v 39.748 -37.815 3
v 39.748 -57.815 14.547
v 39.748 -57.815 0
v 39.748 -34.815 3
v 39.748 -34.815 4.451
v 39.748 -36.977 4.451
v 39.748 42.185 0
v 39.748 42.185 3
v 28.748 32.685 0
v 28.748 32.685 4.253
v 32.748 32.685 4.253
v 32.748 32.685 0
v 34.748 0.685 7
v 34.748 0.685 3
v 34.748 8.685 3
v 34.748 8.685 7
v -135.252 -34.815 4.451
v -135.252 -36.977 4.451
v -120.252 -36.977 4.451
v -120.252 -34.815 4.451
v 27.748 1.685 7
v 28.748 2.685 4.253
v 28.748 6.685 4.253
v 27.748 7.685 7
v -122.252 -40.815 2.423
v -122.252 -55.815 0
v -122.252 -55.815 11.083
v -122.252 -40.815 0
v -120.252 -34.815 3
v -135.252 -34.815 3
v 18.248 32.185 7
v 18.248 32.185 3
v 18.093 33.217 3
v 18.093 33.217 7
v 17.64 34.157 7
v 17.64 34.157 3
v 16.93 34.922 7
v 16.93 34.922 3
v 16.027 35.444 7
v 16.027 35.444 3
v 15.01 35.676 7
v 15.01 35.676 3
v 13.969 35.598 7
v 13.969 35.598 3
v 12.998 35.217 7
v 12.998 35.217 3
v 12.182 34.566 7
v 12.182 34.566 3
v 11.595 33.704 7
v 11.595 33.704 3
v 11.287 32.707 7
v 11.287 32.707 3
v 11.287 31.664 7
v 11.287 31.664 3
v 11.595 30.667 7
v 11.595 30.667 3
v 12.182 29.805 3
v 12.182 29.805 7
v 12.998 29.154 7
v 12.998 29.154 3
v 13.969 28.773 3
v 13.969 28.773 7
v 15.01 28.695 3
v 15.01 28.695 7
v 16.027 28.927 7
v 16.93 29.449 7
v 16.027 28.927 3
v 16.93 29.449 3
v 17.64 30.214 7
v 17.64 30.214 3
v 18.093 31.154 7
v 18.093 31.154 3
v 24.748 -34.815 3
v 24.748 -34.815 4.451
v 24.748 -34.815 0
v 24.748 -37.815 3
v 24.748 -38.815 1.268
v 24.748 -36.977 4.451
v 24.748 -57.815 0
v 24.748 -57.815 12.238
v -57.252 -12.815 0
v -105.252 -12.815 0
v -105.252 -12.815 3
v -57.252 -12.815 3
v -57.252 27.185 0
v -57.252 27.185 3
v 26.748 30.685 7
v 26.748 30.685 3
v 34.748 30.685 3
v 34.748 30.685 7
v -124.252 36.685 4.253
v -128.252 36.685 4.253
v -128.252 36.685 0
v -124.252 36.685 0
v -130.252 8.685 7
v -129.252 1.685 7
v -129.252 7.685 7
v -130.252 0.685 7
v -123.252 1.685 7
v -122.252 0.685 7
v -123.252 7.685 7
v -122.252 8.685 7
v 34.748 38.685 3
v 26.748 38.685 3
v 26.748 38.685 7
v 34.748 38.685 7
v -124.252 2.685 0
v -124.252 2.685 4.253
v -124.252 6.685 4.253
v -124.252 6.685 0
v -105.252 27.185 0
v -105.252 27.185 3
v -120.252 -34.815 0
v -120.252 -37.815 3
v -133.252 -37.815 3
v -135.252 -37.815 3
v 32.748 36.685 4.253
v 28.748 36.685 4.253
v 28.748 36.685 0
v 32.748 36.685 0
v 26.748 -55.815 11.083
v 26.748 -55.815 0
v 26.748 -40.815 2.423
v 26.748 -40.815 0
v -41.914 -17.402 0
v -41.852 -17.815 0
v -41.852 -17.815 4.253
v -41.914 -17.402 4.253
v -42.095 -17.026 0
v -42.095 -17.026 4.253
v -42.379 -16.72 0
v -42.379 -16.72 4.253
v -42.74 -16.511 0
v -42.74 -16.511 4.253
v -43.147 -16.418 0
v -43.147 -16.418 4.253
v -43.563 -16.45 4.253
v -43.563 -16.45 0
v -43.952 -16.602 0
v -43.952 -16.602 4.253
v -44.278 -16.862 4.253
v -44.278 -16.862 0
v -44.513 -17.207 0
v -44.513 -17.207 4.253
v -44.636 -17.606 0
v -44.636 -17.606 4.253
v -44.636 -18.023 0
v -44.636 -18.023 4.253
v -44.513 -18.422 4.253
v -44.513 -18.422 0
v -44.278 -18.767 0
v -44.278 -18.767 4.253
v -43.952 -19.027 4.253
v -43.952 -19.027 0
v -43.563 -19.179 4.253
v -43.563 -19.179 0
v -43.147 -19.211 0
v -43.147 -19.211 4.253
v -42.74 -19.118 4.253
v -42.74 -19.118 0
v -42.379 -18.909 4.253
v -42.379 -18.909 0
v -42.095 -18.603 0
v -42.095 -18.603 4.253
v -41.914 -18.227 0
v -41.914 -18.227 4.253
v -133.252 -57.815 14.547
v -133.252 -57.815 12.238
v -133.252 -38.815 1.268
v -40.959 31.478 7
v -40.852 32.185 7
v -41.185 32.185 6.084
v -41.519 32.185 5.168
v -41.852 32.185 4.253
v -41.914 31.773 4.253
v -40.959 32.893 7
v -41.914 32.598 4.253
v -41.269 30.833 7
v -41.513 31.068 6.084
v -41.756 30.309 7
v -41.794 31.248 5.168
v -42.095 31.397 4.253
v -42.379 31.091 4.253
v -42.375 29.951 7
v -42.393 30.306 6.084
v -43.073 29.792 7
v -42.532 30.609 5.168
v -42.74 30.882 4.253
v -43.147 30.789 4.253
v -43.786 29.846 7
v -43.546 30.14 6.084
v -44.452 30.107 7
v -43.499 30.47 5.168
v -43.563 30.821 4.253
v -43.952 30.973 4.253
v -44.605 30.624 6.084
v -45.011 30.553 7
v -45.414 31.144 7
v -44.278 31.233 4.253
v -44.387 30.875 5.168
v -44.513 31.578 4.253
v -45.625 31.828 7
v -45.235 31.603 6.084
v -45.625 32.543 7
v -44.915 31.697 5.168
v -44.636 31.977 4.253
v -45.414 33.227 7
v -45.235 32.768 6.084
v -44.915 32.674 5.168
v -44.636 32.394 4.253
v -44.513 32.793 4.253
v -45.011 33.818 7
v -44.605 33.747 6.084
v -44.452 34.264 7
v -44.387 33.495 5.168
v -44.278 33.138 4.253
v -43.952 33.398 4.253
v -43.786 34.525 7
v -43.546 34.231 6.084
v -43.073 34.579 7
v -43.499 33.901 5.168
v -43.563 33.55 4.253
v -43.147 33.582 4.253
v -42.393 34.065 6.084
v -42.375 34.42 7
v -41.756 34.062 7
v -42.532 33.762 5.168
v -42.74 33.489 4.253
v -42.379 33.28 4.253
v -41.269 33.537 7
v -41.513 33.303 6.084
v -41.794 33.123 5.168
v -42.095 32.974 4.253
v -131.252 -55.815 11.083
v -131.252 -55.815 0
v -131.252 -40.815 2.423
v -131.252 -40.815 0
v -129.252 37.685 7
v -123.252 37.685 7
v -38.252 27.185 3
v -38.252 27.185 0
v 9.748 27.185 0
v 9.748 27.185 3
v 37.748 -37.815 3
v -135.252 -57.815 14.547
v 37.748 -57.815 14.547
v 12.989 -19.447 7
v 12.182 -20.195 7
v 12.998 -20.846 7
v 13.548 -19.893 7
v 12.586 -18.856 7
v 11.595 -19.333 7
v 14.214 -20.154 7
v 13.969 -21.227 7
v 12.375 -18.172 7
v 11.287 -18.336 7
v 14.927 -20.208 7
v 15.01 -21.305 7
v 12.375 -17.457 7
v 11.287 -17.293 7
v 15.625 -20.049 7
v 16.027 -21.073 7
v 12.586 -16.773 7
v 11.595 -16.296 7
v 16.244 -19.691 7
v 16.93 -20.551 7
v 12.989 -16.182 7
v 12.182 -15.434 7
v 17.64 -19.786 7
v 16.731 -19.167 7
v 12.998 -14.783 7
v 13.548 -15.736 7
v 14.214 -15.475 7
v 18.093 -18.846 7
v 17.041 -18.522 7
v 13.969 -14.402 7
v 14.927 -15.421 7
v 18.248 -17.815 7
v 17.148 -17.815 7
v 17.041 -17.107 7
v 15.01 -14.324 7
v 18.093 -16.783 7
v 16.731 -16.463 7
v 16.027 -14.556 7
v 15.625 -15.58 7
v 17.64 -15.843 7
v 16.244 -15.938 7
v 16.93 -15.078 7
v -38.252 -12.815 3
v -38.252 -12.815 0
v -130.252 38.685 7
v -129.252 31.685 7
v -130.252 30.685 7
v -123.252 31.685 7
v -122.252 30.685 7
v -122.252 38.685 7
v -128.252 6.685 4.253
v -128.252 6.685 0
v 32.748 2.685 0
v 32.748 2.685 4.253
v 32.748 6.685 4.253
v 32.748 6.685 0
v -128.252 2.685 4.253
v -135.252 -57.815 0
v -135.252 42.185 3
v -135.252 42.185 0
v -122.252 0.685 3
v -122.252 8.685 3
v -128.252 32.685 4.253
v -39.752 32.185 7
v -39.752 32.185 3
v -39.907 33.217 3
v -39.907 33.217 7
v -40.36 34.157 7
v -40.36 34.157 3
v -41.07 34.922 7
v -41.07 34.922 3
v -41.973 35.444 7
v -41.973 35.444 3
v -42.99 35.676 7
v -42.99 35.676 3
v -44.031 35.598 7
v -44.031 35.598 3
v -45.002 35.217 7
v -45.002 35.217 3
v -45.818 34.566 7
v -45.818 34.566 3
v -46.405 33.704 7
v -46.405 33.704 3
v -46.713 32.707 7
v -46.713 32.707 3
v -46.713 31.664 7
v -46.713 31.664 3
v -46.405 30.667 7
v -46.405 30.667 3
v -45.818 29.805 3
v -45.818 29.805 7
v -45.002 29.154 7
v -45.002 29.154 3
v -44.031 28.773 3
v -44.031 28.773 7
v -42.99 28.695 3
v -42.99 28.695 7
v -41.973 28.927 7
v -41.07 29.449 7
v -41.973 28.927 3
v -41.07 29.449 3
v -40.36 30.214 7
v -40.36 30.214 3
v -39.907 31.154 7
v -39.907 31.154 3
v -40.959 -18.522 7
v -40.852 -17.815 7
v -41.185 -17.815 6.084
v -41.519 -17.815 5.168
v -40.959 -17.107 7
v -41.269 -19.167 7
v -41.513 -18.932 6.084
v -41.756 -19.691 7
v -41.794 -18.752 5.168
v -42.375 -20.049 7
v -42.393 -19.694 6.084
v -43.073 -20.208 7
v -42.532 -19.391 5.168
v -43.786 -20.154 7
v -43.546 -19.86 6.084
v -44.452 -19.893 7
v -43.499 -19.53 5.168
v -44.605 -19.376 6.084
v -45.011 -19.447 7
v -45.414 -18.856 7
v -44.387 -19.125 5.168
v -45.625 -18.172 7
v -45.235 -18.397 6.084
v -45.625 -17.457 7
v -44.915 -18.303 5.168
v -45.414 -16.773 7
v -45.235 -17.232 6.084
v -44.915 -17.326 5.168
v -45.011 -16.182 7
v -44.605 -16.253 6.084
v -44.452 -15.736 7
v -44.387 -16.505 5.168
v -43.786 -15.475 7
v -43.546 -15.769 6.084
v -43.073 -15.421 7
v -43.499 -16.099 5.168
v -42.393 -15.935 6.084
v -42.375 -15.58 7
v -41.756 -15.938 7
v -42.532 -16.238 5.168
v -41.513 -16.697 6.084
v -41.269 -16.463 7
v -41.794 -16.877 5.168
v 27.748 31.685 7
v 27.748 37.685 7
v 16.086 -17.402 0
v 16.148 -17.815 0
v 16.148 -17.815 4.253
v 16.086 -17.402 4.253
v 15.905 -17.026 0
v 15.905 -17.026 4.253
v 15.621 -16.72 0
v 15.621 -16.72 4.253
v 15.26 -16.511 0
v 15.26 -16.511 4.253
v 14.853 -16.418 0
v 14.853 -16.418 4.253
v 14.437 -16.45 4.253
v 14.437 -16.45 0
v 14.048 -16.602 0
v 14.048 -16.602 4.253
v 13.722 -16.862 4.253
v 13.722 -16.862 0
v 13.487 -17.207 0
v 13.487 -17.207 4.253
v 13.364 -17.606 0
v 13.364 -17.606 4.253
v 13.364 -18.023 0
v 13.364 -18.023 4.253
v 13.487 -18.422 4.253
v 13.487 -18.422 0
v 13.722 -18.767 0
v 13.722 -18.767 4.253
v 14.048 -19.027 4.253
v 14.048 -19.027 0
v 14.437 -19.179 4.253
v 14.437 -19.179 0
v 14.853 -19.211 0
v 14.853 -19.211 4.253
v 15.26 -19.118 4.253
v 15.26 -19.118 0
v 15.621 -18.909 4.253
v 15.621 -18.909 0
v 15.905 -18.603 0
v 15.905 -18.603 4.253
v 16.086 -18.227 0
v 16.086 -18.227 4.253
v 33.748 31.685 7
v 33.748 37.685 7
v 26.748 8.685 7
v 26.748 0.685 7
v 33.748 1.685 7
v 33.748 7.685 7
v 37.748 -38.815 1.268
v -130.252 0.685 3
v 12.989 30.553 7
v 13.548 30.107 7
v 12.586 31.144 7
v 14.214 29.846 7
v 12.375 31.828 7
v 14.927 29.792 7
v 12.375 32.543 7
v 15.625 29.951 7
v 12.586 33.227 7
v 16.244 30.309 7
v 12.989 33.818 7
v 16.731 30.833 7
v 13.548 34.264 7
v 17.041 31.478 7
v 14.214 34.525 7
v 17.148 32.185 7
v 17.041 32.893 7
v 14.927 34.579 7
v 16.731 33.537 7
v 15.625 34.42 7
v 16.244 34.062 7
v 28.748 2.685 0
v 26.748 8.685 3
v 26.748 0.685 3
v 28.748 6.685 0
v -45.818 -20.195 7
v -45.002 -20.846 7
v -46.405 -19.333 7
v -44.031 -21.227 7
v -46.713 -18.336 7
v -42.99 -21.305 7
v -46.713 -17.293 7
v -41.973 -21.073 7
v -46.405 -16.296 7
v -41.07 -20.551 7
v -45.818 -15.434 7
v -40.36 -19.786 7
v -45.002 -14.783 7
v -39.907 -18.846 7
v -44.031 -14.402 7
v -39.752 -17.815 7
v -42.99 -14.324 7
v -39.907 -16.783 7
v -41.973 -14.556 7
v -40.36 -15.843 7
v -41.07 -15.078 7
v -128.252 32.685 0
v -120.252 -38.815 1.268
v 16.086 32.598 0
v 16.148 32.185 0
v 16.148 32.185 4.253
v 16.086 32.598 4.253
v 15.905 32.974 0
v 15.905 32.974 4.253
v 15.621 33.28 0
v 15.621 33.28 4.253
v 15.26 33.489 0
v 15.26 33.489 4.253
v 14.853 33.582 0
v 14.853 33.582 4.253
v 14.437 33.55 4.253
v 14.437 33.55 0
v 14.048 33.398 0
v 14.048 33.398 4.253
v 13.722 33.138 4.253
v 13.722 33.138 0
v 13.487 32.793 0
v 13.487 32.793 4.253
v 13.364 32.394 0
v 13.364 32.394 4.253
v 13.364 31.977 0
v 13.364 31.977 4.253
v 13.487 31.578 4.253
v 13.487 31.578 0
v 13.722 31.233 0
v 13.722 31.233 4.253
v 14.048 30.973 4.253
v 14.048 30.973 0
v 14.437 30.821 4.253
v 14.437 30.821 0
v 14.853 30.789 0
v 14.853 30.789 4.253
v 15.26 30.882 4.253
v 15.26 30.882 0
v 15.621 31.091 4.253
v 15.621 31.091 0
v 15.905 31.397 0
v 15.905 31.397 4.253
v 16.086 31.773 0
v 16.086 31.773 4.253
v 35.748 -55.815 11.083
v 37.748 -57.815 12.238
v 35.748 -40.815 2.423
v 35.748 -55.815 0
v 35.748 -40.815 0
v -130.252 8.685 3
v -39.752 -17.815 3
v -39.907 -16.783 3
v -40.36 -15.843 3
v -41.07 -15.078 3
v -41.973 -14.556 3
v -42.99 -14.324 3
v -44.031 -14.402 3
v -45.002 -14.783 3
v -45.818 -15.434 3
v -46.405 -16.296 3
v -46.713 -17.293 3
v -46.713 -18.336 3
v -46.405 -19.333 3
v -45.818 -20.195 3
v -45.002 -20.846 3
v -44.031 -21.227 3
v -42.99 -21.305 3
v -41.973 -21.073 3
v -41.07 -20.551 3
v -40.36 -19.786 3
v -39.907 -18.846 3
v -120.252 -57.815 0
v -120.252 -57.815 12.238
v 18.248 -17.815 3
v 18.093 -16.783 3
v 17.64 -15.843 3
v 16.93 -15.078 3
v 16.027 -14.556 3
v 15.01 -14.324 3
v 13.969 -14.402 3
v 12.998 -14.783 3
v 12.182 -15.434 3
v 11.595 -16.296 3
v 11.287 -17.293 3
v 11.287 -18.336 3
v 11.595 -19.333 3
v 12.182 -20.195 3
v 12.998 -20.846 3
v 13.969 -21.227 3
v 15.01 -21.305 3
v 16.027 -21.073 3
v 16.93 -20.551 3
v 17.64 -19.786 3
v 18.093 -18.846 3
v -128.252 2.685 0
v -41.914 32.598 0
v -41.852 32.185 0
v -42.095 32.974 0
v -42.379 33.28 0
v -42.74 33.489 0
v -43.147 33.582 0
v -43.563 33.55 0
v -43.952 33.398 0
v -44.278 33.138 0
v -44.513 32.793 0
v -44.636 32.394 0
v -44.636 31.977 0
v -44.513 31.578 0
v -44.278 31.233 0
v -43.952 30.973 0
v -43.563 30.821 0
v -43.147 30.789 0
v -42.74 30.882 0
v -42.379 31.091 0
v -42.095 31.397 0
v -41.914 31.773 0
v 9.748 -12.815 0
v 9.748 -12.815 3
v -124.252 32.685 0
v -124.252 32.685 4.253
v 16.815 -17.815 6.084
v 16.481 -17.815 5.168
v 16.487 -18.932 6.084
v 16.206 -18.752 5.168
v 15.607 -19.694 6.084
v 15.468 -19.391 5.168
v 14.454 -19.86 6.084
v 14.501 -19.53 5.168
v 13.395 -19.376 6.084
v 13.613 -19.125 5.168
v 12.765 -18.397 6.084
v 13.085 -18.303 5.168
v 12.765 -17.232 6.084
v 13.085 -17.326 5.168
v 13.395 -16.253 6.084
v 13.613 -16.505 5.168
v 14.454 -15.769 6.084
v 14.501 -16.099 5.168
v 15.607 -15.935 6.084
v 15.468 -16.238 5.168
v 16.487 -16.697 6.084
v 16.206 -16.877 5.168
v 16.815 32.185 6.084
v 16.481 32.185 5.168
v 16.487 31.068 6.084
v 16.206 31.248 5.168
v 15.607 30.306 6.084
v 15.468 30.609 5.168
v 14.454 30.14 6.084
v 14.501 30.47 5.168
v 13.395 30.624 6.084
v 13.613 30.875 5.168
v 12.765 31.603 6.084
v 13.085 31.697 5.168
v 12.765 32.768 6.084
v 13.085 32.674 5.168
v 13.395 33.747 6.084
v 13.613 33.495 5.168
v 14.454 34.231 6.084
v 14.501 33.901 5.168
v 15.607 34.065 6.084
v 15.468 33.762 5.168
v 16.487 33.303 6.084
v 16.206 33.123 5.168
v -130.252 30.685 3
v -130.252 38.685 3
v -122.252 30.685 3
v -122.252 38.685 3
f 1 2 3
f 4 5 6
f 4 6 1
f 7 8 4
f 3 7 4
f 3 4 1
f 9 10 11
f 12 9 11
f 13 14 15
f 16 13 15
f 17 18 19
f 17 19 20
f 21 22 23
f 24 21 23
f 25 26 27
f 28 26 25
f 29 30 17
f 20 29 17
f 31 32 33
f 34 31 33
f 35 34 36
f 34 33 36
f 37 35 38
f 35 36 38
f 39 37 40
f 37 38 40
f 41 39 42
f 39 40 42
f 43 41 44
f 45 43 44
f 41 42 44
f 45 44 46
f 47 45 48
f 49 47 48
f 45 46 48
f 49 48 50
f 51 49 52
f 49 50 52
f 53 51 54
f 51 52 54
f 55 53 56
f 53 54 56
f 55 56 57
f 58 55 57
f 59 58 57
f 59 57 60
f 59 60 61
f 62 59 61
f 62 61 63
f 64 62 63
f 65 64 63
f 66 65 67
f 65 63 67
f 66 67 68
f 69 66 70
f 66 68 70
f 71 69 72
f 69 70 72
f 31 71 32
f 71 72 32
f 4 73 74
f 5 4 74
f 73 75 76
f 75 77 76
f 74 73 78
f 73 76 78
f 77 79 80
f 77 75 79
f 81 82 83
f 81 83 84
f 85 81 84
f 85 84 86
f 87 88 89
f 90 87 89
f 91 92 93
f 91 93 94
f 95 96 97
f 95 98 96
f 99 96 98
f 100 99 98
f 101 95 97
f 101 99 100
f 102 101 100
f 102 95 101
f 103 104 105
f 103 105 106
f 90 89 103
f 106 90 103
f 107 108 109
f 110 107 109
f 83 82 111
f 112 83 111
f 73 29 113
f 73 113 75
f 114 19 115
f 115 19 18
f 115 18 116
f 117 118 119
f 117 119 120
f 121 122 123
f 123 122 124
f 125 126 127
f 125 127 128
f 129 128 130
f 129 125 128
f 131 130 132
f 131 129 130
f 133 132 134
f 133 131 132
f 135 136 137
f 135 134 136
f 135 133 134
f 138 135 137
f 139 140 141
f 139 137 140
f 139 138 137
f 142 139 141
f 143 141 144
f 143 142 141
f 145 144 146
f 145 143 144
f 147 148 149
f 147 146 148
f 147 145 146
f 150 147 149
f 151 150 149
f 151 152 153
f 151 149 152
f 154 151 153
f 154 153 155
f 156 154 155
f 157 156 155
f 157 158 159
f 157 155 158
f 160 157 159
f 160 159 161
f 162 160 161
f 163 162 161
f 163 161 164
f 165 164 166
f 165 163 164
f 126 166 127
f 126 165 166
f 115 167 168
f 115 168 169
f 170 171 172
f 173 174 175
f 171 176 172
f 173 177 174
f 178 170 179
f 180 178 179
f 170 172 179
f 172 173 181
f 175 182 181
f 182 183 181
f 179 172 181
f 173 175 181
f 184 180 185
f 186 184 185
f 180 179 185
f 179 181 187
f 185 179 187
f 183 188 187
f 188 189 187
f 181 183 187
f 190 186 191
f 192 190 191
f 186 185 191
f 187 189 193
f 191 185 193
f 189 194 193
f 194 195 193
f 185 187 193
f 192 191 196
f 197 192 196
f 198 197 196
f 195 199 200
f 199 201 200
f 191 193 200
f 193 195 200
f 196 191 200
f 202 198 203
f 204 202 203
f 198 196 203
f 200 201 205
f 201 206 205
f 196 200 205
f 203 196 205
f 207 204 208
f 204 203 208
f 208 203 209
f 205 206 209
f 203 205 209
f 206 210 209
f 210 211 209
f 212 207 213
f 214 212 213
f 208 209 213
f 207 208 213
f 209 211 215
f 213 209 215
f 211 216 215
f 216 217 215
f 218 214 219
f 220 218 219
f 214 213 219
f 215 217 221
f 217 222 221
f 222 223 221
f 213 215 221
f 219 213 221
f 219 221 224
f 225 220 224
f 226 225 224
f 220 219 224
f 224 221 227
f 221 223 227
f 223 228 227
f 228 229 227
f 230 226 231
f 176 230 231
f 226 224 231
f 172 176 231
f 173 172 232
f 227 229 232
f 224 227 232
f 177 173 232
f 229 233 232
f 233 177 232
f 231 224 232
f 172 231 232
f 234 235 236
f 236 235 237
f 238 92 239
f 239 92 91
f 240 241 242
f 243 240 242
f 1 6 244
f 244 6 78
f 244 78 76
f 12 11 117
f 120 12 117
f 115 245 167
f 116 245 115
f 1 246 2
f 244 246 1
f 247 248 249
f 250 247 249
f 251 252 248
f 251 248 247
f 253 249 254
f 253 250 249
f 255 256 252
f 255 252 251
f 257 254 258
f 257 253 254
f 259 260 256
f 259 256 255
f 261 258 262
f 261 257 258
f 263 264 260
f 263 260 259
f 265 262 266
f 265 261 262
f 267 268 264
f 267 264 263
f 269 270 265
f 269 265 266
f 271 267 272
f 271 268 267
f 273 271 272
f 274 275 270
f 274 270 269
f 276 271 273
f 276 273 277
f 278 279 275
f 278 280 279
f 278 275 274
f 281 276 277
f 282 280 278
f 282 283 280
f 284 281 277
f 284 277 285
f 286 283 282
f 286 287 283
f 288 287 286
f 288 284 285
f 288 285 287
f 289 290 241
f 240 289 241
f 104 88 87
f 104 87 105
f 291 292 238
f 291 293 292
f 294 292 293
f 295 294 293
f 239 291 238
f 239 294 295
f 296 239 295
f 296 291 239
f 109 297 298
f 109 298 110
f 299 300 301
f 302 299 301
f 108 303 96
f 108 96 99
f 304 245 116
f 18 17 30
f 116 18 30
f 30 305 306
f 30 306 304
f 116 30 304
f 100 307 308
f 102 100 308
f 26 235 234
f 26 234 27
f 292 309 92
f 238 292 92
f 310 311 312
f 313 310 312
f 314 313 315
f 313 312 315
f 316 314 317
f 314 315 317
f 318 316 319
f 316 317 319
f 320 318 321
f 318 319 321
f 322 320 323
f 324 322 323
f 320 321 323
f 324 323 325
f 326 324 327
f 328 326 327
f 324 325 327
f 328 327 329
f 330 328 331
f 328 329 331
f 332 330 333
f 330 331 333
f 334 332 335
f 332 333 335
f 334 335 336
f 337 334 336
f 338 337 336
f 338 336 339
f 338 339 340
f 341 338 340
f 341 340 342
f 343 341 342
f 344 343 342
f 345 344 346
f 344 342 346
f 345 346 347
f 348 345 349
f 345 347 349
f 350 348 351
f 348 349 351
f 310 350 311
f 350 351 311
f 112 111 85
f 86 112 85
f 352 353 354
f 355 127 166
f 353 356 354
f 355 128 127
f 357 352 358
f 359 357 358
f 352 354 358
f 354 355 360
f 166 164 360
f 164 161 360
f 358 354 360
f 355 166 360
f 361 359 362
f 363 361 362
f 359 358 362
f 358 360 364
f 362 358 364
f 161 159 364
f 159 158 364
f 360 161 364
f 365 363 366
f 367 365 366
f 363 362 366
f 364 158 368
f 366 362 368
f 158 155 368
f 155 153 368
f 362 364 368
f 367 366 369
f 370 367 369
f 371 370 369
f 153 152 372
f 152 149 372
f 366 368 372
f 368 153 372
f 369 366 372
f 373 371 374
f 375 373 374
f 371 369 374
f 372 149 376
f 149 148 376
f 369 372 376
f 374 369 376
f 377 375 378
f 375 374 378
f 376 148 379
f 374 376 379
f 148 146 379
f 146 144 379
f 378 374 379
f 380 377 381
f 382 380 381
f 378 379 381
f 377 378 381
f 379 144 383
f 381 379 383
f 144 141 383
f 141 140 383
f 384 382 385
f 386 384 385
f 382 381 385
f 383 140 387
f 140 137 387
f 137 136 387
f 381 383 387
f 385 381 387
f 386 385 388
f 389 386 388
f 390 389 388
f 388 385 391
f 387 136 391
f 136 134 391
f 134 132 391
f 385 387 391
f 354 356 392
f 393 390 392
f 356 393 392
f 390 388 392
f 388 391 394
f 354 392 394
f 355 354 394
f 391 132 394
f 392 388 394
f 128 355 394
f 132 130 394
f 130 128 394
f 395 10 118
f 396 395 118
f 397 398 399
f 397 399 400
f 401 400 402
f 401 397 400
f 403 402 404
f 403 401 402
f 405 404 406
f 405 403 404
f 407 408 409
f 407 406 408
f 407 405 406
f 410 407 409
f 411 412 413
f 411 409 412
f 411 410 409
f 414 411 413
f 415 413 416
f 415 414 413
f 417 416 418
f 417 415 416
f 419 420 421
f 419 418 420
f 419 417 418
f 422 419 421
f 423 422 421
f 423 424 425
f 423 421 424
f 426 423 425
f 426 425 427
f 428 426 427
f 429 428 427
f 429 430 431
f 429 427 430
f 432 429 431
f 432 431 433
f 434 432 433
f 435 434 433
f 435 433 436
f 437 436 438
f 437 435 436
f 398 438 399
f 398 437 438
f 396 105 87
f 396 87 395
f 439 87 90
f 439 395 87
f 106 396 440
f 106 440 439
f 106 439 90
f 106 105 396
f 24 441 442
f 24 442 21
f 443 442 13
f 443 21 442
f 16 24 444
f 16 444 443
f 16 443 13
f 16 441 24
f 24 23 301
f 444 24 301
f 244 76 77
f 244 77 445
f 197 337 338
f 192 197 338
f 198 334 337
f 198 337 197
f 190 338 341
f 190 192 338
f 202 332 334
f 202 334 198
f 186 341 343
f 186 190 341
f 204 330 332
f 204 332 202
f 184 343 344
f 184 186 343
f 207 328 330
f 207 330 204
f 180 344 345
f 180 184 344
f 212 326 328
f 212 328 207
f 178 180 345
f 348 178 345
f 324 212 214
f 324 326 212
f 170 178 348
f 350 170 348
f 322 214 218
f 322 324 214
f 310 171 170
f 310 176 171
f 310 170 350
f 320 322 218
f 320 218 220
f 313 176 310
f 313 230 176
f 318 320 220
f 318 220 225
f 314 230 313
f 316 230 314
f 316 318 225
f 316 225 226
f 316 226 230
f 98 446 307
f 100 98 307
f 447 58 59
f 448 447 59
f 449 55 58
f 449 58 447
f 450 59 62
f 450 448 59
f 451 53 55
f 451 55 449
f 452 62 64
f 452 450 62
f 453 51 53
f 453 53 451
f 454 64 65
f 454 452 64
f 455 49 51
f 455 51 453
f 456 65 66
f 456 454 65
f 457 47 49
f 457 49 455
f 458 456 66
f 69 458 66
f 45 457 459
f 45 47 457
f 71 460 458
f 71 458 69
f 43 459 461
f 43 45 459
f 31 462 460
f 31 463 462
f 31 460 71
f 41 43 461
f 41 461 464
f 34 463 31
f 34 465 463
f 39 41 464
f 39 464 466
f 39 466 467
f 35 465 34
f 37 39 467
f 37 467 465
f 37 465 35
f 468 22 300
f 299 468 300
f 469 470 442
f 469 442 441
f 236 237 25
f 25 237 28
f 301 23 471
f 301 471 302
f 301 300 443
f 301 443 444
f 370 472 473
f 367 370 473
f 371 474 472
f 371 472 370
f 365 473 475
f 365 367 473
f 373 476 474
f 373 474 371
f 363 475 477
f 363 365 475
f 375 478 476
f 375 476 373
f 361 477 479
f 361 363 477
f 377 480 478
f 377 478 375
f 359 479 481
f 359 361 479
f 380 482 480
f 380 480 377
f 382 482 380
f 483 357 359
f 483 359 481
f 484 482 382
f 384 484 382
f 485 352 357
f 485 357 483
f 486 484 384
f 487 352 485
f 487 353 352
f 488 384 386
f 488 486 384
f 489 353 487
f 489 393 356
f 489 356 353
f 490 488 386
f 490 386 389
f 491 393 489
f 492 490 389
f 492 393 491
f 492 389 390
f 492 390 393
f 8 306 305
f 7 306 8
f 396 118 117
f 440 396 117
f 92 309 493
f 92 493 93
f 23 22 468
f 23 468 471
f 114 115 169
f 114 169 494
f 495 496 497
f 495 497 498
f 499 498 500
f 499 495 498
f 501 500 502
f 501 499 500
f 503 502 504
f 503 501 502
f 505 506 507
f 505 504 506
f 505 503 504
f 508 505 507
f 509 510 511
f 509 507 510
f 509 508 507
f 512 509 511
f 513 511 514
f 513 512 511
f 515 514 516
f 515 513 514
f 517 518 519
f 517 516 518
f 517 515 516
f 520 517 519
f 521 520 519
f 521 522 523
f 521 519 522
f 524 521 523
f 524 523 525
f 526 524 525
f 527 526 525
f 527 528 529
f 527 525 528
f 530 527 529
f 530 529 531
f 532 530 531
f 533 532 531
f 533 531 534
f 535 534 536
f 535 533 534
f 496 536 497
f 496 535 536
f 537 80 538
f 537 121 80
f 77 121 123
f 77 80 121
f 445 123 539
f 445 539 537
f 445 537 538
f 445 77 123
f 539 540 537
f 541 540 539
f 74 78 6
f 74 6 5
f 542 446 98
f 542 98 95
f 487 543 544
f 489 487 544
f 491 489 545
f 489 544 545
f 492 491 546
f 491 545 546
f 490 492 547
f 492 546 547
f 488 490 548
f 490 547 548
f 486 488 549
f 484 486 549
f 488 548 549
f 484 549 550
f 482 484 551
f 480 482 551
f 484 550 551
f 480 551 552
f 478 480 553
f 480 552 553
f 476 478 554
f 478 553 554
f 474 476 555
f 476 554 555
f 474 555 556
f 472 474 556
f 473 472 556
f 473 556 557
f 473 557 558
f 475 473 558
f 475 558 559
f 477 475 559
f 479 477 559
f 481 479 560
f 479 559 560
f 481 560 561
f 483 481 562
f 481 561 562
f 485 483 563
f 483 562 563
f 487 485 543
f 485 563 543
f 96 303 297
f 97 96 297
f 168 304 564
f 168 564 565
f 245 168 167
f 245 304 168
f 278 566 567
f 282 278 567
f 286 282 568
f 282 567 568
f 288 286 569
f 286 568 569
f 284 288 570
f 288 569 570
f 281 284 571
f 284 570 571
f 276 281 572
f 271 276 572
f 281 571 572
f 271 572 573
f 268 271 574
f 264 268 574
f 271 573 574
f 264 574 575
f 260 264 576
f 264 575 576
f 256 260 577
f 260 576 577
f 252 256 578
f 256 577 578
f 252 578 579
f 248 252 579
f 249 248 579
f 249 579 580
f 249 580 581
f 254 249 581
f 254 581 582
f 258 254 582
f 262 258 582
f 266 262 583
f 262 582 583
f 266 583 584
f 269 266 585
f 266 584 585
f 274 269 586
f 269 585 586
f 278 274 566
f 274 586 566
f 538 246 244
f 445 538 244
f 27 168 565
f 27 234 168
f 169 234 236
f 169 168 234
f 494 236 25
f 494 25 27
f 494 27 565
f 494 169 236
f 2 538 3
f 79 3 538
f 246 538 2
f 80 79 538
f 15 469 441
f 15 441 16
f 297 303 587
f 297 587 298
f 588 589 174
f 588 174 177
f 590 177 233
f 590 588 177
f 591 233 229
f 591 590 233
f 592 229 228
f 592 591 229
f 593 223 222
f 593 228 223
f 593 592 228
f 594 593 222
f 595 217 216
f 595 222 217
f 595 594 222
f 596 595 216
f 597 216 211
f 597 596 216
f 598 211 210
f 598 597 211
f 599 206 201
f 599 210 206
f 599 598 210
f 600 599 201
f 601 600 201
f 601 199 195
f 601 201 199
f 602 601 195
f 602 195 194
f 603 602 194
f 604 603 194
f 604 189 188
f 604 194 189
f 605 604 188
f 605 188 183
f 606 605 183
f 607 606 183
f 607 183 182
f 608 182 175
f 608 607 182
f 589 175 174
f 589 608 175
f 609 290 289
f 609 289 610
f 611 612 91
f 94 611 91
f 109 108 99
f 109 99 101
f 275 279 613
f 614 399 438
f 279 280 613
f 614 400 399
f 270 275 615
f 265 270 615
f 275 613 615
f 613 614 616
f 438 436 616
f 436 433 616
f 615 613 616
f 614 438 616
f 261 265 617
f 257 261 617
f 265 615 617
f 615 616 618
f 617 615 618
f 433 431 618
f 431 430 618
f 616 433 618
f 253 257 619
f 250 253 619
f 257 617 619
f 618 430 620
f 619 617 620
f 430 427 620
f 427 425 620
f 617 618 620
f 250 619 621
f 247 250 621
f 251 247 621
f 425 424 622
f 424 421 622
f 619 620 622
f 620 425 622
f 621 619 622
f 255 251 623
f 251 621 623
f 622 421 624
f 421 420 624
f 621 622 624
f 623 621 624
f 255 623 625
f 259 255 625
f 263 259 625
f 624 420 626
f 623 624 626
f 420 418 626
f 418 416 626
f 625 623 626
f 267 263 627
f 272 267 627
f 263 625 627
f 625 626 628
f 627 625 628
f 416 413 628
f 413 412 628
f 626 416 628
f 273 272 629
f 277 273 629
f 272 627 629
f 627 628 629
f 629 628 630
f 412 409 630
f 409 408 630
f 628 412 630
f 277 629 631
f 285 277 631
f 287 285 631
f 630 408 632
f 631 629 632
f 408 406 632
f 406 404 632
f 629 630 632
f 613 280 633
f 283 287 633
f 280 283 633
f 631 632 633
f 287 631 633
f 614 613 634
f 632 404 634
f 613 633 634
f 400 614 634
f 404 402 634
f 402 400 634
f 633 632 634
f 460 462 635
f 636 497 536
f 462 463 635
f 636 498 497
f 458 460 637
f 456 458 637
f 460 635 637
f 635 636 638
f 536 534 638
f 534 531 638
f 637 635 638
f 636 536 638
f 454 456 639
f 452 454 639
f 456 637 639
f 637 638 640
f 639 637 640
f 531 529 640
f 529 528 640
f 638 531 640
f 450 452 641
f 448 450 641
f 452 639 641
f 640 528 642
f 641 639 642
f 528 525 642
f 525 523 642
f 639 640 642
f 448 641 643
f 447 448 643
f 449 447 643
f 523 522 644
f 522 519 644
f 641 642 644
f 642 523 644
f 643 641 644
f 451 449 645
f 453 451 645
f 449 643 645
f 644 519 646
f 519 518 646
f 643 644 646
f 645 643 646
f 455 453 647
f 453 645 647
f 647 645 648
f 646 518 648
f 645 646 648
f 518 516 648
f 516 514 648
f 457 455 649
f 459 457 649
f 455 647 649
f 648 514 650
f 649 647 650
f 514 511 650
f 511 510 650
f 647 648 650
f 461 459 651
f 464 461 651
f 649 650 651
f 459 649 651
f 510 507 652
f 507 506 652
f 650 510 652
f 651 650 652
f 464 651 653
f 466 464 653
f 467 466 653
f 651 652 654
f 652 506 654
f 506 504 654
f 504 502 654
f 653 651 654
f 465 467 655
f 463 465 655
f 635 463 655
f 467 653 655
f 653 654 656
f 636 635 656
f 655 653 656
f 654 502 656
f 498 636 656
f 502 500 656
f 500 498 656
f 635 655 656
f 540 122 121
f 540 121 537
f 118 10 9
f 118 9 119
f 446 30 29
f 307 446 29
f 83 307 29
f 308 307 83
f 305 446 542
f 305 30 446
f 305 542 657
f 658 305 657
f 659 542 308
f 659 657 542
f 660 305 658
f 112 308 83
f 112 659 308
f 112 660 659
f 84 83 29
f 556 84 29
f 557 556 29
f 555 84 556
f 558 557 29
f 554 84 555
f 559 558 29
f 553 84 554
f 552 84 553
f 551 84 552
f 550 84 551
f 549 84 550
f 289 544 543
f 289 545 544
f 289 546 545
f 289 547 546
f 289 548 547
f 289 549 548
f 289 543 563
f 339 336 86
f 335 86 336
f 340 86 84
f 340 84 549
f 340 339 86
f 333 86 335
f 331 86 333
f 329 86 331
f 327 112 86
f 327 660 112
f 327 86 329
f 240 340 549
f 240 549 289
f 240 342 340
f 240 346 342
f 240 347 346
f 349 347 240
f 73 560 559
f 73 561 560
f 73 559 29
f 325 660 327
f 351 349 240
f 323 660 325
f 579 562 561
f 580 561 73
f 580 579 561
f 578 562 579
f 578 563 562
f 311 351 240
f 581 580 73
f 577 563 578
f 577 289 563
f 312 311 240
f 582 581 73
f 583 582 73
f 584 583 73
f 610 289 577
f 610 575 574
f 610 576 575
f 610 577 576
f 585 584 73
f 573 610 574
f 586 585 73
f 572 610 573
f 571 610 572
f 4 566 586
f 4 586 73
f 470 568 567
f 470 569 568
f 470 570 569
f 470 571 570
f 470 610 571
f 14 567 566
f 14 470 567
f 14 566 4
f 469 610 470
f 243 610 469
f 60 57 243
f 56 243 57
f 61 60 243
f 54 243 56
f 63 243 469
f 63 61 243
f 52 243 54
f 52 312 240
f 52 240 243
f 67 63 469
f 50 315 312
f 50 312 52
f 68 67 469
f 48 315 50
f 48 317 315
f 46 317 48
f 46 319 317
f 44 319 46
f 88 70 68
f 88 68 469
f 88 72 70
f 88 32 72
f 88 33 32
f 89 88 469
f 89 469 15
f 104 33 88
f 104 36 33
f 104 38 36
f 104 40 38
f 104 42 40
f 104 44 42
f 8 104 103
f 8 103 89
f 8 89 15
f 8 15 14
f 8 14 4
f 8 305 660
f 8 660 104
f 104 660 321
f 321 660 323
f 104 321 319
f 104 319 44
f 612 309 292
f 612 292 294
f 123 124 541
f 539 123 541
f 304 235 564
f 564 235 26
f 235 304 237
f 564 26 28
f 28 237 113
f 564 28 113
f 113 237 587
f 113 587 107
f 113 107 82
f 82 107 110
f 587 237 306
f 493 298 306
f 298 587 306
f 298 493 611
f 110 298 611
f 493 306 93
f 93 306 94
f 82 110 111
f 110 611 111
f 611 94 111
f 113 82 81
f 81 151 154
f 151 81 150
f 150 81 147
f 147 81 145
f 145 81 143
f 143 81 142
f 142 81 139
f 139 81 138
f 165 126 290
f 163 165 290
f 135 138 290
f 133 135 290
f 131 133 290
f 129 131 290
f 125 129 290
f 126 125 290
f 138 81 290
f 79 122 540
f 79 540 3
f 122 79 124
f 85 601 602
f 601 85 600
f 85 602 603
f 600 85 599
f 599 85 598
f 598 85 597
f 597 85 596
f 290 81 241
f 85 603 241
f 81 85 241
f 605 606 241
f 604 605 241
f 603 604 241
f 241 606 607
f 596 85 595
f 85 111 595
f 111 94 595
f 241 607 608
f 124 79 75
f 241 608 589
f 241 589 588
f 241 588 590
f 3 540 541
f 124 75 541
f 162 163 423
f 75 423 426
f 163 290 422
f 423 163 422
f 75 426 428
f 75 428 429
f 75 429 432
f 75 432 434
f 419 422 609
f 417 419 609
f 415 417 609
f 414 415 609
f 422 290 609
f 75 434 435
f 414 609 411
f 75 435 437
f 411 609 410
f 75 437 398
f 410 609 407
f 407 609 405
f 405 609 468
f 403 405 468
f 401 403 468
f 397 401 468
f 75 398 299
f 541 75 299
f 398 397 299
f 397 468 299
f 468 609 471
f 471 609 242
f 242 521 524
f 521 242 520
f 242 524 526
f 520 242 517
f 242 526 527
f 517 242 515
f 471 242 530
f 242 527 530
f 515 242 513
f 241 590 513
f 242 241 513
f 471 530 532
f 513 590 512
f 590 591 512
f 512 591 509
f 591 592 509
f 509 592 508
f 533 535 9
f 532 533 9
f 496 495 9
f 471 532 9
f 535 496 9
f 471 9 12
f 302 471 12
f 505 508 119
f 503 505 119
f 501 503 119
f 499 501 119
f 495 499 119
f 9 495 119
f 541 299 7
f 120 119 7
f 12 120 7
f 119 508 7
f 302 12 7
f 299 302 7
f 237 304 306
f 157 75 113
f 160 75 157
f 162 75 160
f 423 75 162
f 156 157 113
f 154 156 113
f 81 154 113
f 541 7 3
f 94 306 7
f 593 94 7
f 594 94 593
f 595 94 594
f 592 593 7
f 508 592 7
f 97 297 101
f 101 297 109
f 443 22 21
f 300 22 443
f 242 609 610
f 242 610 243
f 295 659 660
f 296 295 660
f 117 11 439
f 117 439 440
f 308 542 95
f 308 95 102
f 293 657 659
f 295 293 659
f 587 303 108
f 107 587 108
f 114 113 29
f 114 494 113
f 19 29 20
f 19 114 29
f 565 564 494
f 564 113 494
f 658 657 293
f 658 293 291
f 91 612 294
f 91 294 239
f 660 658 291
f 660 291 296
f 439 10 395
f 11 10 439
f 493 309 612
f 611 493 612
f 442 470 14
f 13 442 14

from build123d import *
from OCP.BRepFilletAPI import BRepFilletAPI_MakeChamfer

# Parameters (mm, degrees)
SKETCH_1_W               = 175
SKETCH_1_H               = 100
EXTRUDE_1_DEPTH          = 3
EXTRUDE_3_DEPTH          = 175
EXTRUDE_4_DEPTH          = 175
SKETCH_7_W               = 4.38851426
SKETCH_7_H               = 4.191593749
CUT_EXTRUDE_3_DEPTH      = 185.87600743
SKETCH_8_W               = 171
SKETCH_8_H               = 23.094010767
CUT_EXTRUDE_4_DEPTH      = 2
SKETCH_10_R              = 3.5
SKETCH_10_W              = 8
SKETCH_10_H              = 8
EXTRUDE_6_DEPTH          = 4
CUT_EXTRUDE_6_DEPTH      = 148.543018566
CUT_EXTRUDE_6_DEPTH_BACK = 148.543018566
SKETCH_2_R               = 1.4
SKETCH_11_W              = 145
SKETCH_11_H              = 12.237604307
CUT_EXTRUDE_7_DEPTH      = 23
SKETCH_13_W              = 4
SKETCH_13_H              = 4
CUT_EXTRUDE_8_DEPTH      = 148.283964791
CHAMFER_1_SIZE           = 1
CHAMFER_1_SIZE2          = 2.747477419
CUT_EXTRUDE_9_DEPTH      = 148.543018566
CUT_EXTRUDE_9_DEPTH_BACK = 148.543018566
SKETCH_15_W              = 48
SKETCH_15_H              = 40
SKETCH_15_W_2            = 9
SKETCH_15_H_2            = 15


with BuildPart() as part:
    # 草图1 → 凸台-拉伸1 (new body)
    with BuildSketch(Plane.XY):
        with Locations((-47.751936166, -7.814554894)):
            Rectangle(SKETCH_1_W, SKETCH_1_H)
    extrude(amount=EXTRUDE_1_DEPTH)

    # 草图3 → 凸台-拉伸3 (add, through all)
    with BuildSketch(Plane.ZY.offset(135.251936166)):
        Polygon((3, -57.814554894), (14.547005384, -57.814554894), (3, -37.814554894), align=None)
    extrude(amount=-EXTRUDE_3_DEPTH)

    # 草图5 → 凸台-拉伸4 (add, through all)
    with BuildSketch(Plane.ZY.offset(135.251936166)):
        Polygon((3, -37.814554894), (3, -34.814554894), (8.196152423, -34.814554894), align=None)
    extrude(amount=-EXTRUDE_4_DEPTH)

    # 草图7 → 切除-拉伸3 (cut, through all)
    with BuildSketch(Plane.ZY.offset(135.251936166)):
        with Locations((6.645542678, -35.647071791)):
            Rectangle(SKETCH_7_W, SKETCH_7_H)
    extrude(amount=-CUT_EXTRUDE_3_DEPTH, mode=Mode.SUBTRACT)

    # 草图8 → 切除-拉伸4 (cut)
    with BuildSketch(Plane(origin=(0, -8.154600618, -14.124182585), x_dir=(1, 0, 0), z_dir=(0, 0.49999999999999506, 0.8660254037844415))):
        with Locations((-47.751936166, -45.795370555)):
            Rectangle(SKETCH_8_W, SKETCH_8_H)
    extrude(amount=-CUT_EXTRUDE_4_DEPTH, mode=Mode.SUBTRACT)

    # 草图10 → 凸台-拉伸6 (add)
    with BuildSketch(Plane.XY.offset(3)):
        with Locations((-43.251936166, 32.185445106)):
            Circle(SKETCH_10_R)
        with Locations((14.748063834, 32.185445106)):
            Circle(SKETCH_10_R)
        with Locations((-43.251936166, -17.814554894)):
            Circle(SKETCH_10_R)
        with Locations((14.748063834, -17.814554894)):
            Circle(SKETCH_10_R)
        with Locations((-126.251936166, 34.685445106)):
            Rectangle(SKETCH_10_W, SKETCH_10_H)
        with Locations((30.748063834, 34.685445106)):
            Rectangle(SKETCH_10_W, SKETCH_10_H)
        with Locations((-126.251936166, 4.685445106)):
            Rectangle(SKETCH_10_W, SKETCH_10_H)
        with Locations((30.748063834, 4.685445106)):
            Rectangle(SKETCH_10_W, SKETCH_10_H)
    extrude(amount=EXTRUDE_6_DEPTH)

    # 草图2 → 切除-拉伸6 (cut, two sides: drawn at the far end of the back side and taken through both)
    with BuildSketch(Plane.XY.offset(3).offset(-CUT_EXTRUDE_6_DEPTH_BACK)):
        with Locations((-43.251936166, 32.185445106)):
            Circle(SKETCH_2_R)
        with Locations((14.748063834, 32.185445106)):
            Circle(SKETCH_2_R)
        with Locations((14.748063834, -17.814554894)):
            Circle(SKETCH_2_R)
        with Locations((-43.251936166, -17.814554894)):
            Circle(SKETCH_2_R)
    extrude(amount=CUT_EXTRUDE_6_DEPTH + CUT_EXTRUDE_6_DEPTH_BACK, mode=Mode.SUBTRACT)

    # 草图11 → 切除-拉伸7 (cut)
    with BuildSketch(Plane.XZ.offset(57.814554894)):
        with Locations((-47.751936166, 6.118802154)):
            Rectangle(SKETCH_11_W, SKETCH_11_H)
    extrude(amount=-CUT_EXTRUDE_7_DEPTH, mode=Mode.SUBTRACT)

    # 草图13 → 切除-拉伸8 (cut, through all)
    with BuildSketch(Plane.XY.offset(7)):
        with Locations((-126.251936166, 34.685445106)):
            Rectangle(SKETCH_13_W, SKETCH_13_H)
        with Locations((30.748063834, 34.685445106)):
            Rectangle(SKETCH_13_W, SKETCH_13_H)
        with Locations((-126.251936166, 4.685445106)):
            Rectangle(SKETCH_13_W, SKETCH_13_H)
        with Locations((30.748063834, 4.685445106)):
            Rectangle(SKETCH_13_W, SKETCH_13_H)
    extrude(amount=-CUT_EXTRUDE_8_DEPTH, mode=Mode.SUBTRACT)

    # 倒角1: one chamfer whose edges measure the first distance from different faces: ONE call of the kernel's chamfer builder (chamfer() names one face for all edges)
    chamfer_1_edges_1 = [part.edges().sort_by_distance(p)[0] for p in [
        (13.348063834, 32.185445106, 7),
    ]]
    chamfer_1_side_1 = [part.faces().sort_by_distance(p)[0] for p in [
        (11.347058783, 32.185445106, 7),
    ]]
    chamfer_1_edges_2 = [part.edges().sort_by_distance(p)[0] for p in [
        (-44.651936166, -17.814554894, 7),
    ]]
    chamfer_1_side_2 = [part.faces().sort_by_distance(p)[0] for p in [
        (-46.652941217, -17.814554894, 7),
    ]]
    chamfer_1_edges_3 = [part.edges().sort_by_distance(p)[0] for p in [
        (13.348063834, -17.814554894, 7),
    ]]
    chamfer_1_side_3 = [part.faces().sort_by_distance(p)[0] for p in [
        (11.347058783, -17.814554894, 7),
    ]]
    chamfer_1_edges_4 = [part.edges().sort_by_distance(p)[0] for p in [
        (-44.651936166, 32.185445106, 7),
    ]]
    chamfer_1_side_4 = [part.faces().sort_by_distance(p)[0] for p in [
        (-46.652941217, 32.185445106, 7),
    ]]
    chamfer_1_edges_5 = [part.edges().sort_by_distance(p)[0] for p in [
        (30.748063834, 36.685445106, 7),
        (28.748063834, 34.685445106, 7),
        (30.748063834, 32.685445106, 7),
        (32.748063834, 34.685445106, 7),
    ]]
    chamfer_1_side_5 = [part.faces().sort_by_distance(p)[0] for p in [
        (26.861200919, 34.685445106, 7),
    ]]
    chamfer_1_edges_6 = [part.edges().sort_by_distance(p)[0] for p in [
        (-126.251936166, 6.685445106, 7),
        (-128.251936166, 4.685445106, 7),
        (-126.251936166, 2.685445106, 7),
        (-124.251936166, 4.685445106, 7),
    ]]
    chamfer_1_side_6 = [part.faces().sort_by_distance(p)[0] for p in [
        (-130.138799081, 4.685445106, 7),
    ]]
    chamfer_1_edges_7 = [part.edges().sort_by_distance(p)[0] for p in [
        (30.748063834, 6.685445106, 7),
        (28.748063834, 4.685445106, 7),
        (30.748063834, 2.685445106, 7),
        (32.748063834, 4.685445106, 7),
    ]]
    chamfer_1_side_7 = [part.faces().sort_by_distance(p)[0] for p in [
        (26.861200919, 4.685445106, 7),
    ]]
    chamfer_1_edges_8 = [part.edges().sort_by_distance(p)[0] for p in [
        (-128.251936166, 34.685445106, 7),
        (-126.251936166, 32.685445106, 7),
        (-124.251936166, 34.685445106, 7),
        (-126.251936166, 36.685445106, 7),
    ]]
    chamfer_1_side_8 = [part.faces().sort_by_distance(p)[0] for p in [
        (-126.251936166, 38.572308021, 7),
    ]]
    chamfer_1 = BRepFilletAPI_MakeChamfer(part.part.solid().wrapped)
    for e in chamfer_1_edges_1:
        chamfer_1.Add(CHAMFER_1_SIZE, CHAMFER_1_SIZE2, e.wrapped, chamfer_1_side_1[0].wrapped)  # the first distance lies on this face
    for e in chamfer_1_edges_2:
        chamfer_1.Add(CHAMFER_1_SIZE, CHAMFER_1_SIZE2, e.wrapped, chamfer_1_side_2[0].wrapped)  # the first distance lies on this face
    for e in chamfer_1_edges_3:
        chamfer_1.Add(CHAMFER_1_SIZE, CHAMFER_1_SIZE2, e.wrapped, chamfer_1_side_3[0].wrapped)  # the first distance lies on this face
    for e in chamfer_1_edges_4:
        chamfer_1.Add(CHAMFER_1_SIZE, CHAMFER_1_SIZE2, e.wrapped, chamfer_1_side_4[0].wrapped)  # the first distance lies on this face
    for e in chamfer_1_edges_5:
        chamfer_1.Add(CHAMFER_1_SIZE, CHAMFER_1_SIZE2, e.wrapped, chamfer_1_side_5[0].wrapped)  # the first distance lies on this face
    for e in chamfer_1_edges_6:
        chamfer_1.Add(CHAMFER_1_SIZE, CHAMFER_1_SIZE2, e.wrapped, chamfer_1_side_6[0].wrapped)  # the first distance lies on this face
    for e in chamfer_1_edges_7:
        chamfer_1.Add(CHAMFER_1_SIZE, CHAMFER_1_SIZE2, e.wrapped, chamfer_1_side_7[0].wrapped)  # the first distance lies on this face
    for e in chamfer_1_edges_8:
        chamfer_1.Add(CHAMFER_1_SIZE, CHAMFER_1_SIZE2, e.wrapped, chamfer_1_side_8[0].wrapped)  # the first distance lies on this face
    add(Compound.cast(chamfer_1.Shape()), mode=Mode.REPLACE)

    # 草图15 → 切除-拉伸9 (cut, two sides: drawn at the far end of the back side and taken through both)
    with BuildSketch(Plane.XY.offset(3).offset(-CUT_EXTRUDE_9_DEPTH_BACK)):
        with Locations((-81.251936166, 7.185445106)):
            Rectangle(SKETCH_15_W, SKETCH_15_H)
        with Locations((-14.251936166, 7.185445106)):
            Rectangle(SKETCH_15_W, SKETCH_15_H)
        with Locations((-126.751936166, -48.314554894)):
            Rectangle(SKETCH_15_W_2, SKETCH_15_H_2)
        with Locations((31.248063834, -48.314554894)):
            Rectangle(SKETCH_15_W_2, SKETCH_15_H_2)
    extrude(amount=CUT_EXTRUDE_9_DEPTH + CUT_EXTRUDE_9_DEPTH_BACK, mode=Mode.SUBTRACT)


solid = part.part
